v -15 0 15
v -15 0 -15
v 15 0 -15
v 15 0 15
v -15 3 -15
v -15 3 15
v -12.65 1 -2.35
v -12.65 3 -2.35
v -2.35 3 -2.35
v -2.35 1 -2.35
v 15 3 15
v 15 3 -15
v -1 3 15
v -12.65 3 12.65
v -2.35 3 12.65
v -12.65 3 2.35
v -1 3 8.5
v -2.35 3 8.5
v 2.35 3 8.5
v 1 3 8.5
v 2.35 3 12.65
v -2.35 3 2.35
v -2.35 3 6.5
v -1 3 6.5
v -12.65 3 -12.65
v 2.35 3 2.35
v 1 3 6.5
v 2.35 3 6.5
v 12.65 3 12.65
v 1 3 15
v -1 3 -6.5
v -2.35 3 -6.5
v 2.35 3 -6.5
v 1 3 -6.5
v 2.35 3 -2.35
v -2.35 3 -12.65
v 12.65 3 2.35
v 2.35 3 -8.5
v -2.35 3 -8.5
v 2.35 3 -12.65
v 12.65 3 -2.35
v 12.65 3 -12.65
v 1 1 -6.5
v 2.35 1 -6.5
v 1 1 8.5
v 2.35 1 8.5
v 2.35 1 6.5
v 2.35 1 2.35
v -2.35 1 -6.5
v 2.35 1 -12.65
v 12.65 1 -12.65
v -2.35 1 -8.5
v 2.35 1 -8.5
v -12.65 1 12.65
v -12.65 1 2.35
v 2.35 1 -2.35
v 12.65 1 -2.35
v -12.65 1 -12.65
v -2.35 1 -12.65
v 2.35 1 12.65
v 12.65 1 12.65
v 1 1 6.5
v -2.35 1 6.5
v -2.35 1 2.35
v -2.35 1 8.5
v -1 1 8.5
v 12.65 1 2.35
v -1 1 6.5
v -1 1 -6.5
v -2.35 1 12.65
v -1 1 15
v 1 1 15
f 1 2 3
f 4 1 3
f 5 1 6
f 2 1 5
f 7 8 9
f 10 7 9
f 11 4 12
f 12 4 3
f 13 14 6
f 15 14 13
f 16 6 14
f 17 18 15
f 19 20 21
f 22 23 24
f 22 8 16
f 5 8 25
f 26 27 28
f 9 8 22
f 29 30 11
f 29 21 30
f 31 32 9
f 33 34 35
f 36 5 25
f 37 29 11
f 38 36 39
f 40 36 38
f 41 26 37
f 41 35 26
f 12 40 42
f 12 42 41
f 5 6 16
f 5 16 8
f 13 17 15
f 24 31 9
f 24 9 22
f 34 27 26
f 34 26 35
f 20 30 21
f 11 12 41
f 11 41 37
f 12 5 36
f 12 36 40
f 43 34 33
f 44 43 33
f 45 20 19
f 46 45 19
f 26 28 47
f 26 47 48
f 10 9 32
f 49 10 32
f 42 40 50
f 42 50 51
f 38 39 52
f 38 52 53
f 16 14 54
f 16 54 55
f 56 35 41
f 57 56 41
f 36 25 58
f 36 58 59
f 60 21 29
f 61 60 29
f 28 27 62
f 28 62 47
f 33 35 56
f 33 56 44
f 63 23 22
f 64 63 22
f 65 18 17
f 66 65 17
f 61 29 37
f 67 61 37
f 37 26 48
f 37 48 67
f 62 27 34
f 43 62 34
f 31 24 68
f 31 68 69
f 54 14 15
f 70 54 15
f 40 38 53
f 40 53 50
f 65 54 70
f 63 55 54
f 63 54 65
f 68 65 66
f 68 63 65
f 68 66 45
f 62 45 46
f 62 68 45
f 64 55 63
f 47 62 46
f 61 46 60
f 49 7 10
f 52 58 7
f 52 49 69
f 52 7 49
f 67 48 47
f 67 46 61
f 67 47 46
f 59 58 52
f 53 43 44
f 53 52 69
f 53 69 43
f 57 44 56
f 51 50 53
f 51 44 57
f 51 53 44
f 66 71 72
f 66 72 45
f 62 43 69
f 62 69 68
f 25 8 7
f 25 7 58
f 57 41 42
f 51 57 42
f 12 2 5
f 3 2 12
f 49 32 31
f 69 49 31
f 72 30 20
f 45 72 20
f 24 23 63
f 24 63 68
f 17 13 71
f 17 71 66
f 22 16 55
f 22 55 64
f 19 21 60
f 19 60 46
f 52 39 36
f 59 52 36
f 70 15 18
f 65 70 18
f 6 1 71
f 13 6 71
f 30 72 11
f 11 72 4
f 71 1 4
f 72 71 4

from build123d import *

# Parameters (mm, degrees)
BOTTOMSKETCH_W               = 30
BOTTOMSKETCH_H               = 30
BOTTOMEXTRUSION_DEPTH        = 3
HOLESKETCH_W                 = 10.3
HOLESKETCH_H                 = 10.3
HOLEEXTRUSION_DEPTH          = 2
LATERALWIRESKETCH_W          = 4.7
LATERALWIRESKETCH_H          = 2
LATERALWIREEXTRUSION_DEPTH   = 2
WIRERESEVOIRSKETCH_W         = 2
WIRERESEVOIRSKETCH_H         = 21.5
WIRERESERVOIREXTRUSION_DEPTH = 2


with BuildPart() as part:
    # bottomSketch → bottomExtrusion (new body)
    with BuildSketch(Plane(origin=(0, 0, 0), x_dir=(1, 0, 0), z_dir=(0, 1, 0))):
        Rectangle(BOTTOMSKETCH_W, BOTTOMSKETCH_H)
    extrude(amount=BOTTOMEXTRUSION_DEPTH)

    # holeSketch → holeExtrusion (cut)
    with BuildSketch(Plane(origin=(0, 3, 0), x_dir=(1, 0, 0), z_dir=(0, 1, 0))):
        with Locations((-7.5, 7.5)):
            Rectangle(HOLESKETCH_W, HOLESKETCH_H)
        with Locations((-7.5, -7.5)):
            Rectangle(HOLESKETCH_W, HOLESKETCH_H)
        with Locations((7.5, 7.5)):
            Rectangle(HOLESKETCH_W, HOLESKETCH_H)
        with Locations((7.5, -7.5)):
            Rectangle(HOLESKETCH_W, HOLESKETCH_H)
    extrude(amount=-HOLEEXTRUSION_DEPTH, mode=Mode.SUBTRACT)

    # lateralWireSketch → lateralWireExtrusion (cut)
    with BuildSketch(Plane(origin=(0, 3, 0), x_dir=(1, 0, 0), z_dir=(0, 1, 0))):
        with Locations((0, -7.5)):
            Rectangle(LATERALWIRESKETCH_W, LATERALWIRESKETCH_H)
        with Locations((0, 7.5)):
            Rectangle(LATERALWIRESKETCH_W, LATERALWIRESKETCH_H)
    extrude(amount=-LATERALWIREEXTRUSION_DEPTH, mode=Mode.SUBTRACT)

    # wireResevoirSketch → wireReservoirExtrusion (cut)
    with BuildSketch(Plane(origin=(0, 3, 0), x_dir=(1, 0, 0), z_dir=(0, 1, 0))):
        with Locations((0, -4.25)):
            Rectangle(WIRERESEVOIRSKETCH_W, WIRERESEVOIRSKETCH_H)
    extrude(amount=-WIRERESERVOIREXTRUSION_DEPTH, mode=Mode.SUBTRACT)


solid = part.part
